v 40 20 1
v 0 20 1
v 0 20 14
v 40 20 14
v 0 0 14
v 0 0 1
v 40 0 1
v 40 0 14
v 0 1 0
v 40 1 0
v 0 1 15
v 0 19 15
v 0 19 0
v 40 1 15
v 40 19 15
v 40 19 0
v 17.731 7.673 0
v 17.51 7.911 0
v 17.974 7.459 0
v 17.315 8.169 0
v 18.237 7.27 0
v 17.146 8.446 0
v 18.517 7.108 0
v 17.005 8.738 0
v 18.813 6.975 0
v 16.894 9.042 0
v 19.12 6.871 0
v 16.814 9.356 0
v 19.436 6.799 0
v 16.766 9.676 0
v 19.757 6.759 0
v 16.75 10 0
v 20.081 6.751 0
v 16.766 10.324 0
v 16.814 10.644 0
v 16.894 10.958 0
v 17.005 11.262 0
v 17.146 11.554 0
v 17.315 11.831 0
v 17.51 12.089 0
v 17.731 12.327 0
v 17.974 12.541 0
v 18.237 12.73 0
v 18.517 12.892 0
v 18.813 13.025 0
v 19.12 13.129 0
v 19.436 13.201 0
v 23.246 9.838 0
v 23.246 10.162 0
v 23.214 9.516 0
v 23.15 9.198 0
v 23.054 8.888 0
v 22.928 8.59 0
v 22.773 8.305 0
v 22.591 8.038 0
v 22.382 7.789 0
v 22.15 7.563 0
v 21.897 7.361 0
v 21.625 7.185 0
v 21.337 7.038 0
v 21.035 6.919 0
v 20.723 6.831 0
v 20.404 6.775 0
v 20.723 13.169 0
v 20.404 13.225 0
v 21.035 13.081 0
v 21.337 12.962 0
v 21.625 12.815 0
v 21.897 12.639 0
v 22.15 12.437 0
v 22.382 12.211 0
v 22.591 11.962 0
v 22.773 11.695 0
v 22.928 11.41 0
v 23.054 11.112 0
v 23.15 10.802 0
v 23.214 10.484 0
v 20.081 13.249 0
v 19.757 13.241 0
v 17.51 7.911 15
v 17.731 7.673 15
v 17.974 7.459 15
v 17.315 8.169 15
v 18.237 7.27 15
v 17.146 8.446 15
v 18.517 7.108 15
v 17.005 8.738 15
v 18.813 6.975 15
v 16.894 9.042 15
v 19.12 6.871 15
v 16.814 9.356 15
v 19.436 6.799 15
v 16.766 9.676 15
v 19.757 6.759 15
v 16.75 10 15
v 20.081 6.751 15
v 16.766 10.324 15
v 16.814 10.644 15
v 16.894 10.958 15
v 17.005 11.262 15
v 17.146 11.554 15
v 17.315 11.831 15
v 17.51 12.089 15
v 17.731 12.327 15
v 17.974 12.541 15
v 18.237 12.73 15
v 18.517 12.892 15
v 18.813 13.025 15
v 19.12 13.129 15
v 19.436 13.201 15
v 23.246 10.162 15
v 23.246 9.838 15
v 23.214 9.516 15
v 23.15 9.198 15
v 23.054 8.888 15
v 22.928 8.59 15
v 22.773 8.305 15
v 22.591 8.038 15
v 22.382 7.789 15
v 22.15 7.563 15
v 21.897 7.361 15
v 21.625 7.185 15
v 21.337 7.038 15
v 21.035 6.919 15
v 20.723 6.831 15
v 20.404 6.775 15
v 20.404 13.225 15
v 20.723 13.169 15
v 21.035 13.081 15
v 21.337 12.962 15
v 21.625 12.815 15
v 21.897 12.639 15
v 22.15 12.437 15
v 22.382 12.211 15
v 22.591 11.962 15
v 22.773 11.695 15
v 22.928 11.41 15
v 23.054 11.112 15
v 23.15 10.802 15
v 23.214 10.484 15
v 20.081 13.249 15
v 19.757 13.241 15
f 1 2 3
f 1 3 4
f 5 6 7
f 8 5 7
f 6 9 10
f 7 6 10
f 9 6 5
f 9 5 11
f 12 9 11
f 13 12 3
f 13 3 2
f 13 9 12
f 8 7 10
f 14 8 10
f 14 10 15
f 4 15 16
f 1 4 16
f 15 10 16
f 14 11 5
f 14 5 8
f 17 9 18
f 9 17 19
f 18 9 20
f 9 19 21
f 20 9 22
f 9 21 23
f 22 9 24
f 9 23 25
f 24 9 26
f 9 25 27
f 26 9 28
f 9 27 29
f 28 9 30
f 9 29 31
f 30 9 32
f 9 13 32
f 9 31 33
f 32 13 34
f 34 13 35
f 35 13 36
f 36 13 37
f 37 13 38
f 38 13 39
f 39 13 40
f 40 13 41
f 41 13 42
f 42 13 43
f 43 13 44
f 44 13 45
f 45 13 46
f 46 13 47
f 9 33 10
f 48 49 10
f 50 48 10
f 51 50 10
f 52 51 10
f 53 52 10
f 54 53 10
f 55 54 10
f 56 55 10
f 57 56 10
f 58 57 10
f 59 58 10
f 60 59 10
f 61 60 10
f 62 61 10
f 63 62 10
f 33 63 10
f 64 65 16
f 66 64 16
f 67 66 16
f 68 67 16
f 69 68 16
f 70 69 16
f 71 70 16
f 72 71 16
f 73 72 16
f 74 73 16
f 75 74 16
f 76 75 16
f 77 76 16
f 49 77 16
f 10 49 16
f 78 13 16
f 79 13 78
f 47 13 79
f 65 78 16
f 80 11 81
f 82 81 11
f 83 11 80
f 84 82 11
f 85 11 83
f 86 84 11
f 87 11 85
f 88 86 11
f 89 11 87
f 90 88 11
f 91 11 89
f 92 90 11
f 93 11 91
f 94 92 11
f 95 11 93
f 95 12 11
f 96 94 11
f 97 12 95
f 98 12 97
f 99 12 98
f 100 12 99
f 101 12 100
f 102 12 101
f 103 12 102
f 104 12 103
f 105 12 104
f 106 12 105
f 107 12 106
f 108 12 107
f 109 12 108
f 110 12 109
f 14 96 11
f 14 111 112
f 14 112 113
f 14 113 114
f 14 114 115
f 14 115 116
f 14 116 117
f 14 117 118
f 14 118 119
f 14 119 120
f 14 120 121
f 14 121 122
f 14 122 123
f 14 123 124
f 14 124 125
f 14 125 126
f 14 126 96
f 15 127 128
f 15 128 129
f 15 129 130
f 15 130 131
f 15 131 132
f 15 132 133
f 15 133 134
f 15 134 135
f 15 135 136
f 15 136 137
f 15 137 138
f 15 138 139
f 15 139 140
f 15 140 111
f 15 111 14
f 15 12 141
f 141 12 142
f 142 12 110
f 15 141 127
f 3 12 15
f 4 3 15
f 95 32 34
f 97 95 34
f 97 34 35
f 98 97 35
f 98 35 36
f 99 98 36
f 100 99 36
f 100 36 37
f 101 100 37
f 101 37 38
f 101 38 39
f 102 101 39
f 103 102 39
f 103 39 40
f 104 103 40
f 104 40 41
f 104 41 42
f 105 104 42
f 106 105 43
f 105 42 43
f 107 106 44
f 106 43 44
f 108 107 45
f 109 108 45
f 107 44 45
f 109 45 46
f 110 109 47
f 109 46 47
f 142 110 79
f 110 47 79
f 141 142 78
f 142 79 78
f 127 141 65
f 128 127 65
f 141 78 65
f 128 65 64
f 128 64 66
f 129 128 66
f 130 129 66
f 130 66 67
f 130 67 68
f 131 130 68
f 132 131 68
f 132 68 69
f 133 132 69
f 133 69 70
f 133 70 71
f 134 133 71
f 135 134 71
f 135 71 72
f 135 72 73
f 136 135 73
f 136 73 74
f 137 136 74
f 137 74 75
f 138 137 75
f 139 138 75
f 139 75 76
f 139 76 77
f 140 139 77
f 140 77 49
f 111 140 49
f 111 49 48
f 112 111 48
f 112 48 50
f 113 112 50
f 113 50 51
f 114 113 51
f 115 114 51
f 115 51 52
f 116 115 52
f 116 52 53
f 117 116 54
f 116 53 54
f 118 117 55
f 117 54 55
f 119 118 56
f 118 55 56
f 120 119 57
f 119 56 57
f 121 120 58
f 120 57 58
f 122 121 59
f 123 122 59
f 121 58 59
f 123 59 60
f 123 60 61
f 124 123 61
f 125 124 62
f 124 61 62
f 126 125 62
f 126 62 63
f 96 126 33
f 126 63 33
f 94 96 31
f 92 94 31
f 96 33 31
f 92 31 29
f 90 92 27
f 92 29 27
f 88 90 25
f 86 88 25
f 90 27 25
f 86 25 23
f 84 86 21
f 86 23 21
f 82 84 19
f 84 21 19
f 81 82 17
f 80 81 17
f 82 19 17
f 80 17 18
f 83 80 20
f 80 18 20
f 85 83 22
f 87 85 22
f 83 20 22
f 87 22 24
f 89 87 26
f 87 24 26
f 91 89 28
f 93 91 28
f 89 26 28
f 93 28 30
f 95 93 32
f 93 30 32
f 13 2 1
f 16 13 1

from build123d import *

# Parameters (mm, degrees)
F0_W     = 40
F0_H     = 20
F1_DEPTH = 15
F3_D     = 6.5
F4_SIZE  = 1
F5_SIZE  = 1


with BuildPart() as f1:
    # F0 (on Top) → F1 (new body)
    with BuildSketch(Plane.XY):
        with Locations((20, 10)):
            Rectangle(F0_W, F0_H)
    extrude(amount=F1_DEPTH)

    # F3 (through all)
    with Locations(Plane.XY.offset(15)):
        with Locations((20, 10)):
            Hole(F3_D / 2)

    # F4
    f4_edges = [f1.edges().sort_by_distance(p)[0] for p in [
        (20, 0, 15),
        (20, 20, 15),
    ]]
    chamfer(f4_edges, length=F4_SIZE)

    # F5
    f5_edges = [f1.edges().sort_by_distance(p)[0] for p in [
        (20, 0, 0),
        (20, 20, 0),
    ]]
    chamfer(f5_edges, length=F5_SIZE)


solid = f1.part
